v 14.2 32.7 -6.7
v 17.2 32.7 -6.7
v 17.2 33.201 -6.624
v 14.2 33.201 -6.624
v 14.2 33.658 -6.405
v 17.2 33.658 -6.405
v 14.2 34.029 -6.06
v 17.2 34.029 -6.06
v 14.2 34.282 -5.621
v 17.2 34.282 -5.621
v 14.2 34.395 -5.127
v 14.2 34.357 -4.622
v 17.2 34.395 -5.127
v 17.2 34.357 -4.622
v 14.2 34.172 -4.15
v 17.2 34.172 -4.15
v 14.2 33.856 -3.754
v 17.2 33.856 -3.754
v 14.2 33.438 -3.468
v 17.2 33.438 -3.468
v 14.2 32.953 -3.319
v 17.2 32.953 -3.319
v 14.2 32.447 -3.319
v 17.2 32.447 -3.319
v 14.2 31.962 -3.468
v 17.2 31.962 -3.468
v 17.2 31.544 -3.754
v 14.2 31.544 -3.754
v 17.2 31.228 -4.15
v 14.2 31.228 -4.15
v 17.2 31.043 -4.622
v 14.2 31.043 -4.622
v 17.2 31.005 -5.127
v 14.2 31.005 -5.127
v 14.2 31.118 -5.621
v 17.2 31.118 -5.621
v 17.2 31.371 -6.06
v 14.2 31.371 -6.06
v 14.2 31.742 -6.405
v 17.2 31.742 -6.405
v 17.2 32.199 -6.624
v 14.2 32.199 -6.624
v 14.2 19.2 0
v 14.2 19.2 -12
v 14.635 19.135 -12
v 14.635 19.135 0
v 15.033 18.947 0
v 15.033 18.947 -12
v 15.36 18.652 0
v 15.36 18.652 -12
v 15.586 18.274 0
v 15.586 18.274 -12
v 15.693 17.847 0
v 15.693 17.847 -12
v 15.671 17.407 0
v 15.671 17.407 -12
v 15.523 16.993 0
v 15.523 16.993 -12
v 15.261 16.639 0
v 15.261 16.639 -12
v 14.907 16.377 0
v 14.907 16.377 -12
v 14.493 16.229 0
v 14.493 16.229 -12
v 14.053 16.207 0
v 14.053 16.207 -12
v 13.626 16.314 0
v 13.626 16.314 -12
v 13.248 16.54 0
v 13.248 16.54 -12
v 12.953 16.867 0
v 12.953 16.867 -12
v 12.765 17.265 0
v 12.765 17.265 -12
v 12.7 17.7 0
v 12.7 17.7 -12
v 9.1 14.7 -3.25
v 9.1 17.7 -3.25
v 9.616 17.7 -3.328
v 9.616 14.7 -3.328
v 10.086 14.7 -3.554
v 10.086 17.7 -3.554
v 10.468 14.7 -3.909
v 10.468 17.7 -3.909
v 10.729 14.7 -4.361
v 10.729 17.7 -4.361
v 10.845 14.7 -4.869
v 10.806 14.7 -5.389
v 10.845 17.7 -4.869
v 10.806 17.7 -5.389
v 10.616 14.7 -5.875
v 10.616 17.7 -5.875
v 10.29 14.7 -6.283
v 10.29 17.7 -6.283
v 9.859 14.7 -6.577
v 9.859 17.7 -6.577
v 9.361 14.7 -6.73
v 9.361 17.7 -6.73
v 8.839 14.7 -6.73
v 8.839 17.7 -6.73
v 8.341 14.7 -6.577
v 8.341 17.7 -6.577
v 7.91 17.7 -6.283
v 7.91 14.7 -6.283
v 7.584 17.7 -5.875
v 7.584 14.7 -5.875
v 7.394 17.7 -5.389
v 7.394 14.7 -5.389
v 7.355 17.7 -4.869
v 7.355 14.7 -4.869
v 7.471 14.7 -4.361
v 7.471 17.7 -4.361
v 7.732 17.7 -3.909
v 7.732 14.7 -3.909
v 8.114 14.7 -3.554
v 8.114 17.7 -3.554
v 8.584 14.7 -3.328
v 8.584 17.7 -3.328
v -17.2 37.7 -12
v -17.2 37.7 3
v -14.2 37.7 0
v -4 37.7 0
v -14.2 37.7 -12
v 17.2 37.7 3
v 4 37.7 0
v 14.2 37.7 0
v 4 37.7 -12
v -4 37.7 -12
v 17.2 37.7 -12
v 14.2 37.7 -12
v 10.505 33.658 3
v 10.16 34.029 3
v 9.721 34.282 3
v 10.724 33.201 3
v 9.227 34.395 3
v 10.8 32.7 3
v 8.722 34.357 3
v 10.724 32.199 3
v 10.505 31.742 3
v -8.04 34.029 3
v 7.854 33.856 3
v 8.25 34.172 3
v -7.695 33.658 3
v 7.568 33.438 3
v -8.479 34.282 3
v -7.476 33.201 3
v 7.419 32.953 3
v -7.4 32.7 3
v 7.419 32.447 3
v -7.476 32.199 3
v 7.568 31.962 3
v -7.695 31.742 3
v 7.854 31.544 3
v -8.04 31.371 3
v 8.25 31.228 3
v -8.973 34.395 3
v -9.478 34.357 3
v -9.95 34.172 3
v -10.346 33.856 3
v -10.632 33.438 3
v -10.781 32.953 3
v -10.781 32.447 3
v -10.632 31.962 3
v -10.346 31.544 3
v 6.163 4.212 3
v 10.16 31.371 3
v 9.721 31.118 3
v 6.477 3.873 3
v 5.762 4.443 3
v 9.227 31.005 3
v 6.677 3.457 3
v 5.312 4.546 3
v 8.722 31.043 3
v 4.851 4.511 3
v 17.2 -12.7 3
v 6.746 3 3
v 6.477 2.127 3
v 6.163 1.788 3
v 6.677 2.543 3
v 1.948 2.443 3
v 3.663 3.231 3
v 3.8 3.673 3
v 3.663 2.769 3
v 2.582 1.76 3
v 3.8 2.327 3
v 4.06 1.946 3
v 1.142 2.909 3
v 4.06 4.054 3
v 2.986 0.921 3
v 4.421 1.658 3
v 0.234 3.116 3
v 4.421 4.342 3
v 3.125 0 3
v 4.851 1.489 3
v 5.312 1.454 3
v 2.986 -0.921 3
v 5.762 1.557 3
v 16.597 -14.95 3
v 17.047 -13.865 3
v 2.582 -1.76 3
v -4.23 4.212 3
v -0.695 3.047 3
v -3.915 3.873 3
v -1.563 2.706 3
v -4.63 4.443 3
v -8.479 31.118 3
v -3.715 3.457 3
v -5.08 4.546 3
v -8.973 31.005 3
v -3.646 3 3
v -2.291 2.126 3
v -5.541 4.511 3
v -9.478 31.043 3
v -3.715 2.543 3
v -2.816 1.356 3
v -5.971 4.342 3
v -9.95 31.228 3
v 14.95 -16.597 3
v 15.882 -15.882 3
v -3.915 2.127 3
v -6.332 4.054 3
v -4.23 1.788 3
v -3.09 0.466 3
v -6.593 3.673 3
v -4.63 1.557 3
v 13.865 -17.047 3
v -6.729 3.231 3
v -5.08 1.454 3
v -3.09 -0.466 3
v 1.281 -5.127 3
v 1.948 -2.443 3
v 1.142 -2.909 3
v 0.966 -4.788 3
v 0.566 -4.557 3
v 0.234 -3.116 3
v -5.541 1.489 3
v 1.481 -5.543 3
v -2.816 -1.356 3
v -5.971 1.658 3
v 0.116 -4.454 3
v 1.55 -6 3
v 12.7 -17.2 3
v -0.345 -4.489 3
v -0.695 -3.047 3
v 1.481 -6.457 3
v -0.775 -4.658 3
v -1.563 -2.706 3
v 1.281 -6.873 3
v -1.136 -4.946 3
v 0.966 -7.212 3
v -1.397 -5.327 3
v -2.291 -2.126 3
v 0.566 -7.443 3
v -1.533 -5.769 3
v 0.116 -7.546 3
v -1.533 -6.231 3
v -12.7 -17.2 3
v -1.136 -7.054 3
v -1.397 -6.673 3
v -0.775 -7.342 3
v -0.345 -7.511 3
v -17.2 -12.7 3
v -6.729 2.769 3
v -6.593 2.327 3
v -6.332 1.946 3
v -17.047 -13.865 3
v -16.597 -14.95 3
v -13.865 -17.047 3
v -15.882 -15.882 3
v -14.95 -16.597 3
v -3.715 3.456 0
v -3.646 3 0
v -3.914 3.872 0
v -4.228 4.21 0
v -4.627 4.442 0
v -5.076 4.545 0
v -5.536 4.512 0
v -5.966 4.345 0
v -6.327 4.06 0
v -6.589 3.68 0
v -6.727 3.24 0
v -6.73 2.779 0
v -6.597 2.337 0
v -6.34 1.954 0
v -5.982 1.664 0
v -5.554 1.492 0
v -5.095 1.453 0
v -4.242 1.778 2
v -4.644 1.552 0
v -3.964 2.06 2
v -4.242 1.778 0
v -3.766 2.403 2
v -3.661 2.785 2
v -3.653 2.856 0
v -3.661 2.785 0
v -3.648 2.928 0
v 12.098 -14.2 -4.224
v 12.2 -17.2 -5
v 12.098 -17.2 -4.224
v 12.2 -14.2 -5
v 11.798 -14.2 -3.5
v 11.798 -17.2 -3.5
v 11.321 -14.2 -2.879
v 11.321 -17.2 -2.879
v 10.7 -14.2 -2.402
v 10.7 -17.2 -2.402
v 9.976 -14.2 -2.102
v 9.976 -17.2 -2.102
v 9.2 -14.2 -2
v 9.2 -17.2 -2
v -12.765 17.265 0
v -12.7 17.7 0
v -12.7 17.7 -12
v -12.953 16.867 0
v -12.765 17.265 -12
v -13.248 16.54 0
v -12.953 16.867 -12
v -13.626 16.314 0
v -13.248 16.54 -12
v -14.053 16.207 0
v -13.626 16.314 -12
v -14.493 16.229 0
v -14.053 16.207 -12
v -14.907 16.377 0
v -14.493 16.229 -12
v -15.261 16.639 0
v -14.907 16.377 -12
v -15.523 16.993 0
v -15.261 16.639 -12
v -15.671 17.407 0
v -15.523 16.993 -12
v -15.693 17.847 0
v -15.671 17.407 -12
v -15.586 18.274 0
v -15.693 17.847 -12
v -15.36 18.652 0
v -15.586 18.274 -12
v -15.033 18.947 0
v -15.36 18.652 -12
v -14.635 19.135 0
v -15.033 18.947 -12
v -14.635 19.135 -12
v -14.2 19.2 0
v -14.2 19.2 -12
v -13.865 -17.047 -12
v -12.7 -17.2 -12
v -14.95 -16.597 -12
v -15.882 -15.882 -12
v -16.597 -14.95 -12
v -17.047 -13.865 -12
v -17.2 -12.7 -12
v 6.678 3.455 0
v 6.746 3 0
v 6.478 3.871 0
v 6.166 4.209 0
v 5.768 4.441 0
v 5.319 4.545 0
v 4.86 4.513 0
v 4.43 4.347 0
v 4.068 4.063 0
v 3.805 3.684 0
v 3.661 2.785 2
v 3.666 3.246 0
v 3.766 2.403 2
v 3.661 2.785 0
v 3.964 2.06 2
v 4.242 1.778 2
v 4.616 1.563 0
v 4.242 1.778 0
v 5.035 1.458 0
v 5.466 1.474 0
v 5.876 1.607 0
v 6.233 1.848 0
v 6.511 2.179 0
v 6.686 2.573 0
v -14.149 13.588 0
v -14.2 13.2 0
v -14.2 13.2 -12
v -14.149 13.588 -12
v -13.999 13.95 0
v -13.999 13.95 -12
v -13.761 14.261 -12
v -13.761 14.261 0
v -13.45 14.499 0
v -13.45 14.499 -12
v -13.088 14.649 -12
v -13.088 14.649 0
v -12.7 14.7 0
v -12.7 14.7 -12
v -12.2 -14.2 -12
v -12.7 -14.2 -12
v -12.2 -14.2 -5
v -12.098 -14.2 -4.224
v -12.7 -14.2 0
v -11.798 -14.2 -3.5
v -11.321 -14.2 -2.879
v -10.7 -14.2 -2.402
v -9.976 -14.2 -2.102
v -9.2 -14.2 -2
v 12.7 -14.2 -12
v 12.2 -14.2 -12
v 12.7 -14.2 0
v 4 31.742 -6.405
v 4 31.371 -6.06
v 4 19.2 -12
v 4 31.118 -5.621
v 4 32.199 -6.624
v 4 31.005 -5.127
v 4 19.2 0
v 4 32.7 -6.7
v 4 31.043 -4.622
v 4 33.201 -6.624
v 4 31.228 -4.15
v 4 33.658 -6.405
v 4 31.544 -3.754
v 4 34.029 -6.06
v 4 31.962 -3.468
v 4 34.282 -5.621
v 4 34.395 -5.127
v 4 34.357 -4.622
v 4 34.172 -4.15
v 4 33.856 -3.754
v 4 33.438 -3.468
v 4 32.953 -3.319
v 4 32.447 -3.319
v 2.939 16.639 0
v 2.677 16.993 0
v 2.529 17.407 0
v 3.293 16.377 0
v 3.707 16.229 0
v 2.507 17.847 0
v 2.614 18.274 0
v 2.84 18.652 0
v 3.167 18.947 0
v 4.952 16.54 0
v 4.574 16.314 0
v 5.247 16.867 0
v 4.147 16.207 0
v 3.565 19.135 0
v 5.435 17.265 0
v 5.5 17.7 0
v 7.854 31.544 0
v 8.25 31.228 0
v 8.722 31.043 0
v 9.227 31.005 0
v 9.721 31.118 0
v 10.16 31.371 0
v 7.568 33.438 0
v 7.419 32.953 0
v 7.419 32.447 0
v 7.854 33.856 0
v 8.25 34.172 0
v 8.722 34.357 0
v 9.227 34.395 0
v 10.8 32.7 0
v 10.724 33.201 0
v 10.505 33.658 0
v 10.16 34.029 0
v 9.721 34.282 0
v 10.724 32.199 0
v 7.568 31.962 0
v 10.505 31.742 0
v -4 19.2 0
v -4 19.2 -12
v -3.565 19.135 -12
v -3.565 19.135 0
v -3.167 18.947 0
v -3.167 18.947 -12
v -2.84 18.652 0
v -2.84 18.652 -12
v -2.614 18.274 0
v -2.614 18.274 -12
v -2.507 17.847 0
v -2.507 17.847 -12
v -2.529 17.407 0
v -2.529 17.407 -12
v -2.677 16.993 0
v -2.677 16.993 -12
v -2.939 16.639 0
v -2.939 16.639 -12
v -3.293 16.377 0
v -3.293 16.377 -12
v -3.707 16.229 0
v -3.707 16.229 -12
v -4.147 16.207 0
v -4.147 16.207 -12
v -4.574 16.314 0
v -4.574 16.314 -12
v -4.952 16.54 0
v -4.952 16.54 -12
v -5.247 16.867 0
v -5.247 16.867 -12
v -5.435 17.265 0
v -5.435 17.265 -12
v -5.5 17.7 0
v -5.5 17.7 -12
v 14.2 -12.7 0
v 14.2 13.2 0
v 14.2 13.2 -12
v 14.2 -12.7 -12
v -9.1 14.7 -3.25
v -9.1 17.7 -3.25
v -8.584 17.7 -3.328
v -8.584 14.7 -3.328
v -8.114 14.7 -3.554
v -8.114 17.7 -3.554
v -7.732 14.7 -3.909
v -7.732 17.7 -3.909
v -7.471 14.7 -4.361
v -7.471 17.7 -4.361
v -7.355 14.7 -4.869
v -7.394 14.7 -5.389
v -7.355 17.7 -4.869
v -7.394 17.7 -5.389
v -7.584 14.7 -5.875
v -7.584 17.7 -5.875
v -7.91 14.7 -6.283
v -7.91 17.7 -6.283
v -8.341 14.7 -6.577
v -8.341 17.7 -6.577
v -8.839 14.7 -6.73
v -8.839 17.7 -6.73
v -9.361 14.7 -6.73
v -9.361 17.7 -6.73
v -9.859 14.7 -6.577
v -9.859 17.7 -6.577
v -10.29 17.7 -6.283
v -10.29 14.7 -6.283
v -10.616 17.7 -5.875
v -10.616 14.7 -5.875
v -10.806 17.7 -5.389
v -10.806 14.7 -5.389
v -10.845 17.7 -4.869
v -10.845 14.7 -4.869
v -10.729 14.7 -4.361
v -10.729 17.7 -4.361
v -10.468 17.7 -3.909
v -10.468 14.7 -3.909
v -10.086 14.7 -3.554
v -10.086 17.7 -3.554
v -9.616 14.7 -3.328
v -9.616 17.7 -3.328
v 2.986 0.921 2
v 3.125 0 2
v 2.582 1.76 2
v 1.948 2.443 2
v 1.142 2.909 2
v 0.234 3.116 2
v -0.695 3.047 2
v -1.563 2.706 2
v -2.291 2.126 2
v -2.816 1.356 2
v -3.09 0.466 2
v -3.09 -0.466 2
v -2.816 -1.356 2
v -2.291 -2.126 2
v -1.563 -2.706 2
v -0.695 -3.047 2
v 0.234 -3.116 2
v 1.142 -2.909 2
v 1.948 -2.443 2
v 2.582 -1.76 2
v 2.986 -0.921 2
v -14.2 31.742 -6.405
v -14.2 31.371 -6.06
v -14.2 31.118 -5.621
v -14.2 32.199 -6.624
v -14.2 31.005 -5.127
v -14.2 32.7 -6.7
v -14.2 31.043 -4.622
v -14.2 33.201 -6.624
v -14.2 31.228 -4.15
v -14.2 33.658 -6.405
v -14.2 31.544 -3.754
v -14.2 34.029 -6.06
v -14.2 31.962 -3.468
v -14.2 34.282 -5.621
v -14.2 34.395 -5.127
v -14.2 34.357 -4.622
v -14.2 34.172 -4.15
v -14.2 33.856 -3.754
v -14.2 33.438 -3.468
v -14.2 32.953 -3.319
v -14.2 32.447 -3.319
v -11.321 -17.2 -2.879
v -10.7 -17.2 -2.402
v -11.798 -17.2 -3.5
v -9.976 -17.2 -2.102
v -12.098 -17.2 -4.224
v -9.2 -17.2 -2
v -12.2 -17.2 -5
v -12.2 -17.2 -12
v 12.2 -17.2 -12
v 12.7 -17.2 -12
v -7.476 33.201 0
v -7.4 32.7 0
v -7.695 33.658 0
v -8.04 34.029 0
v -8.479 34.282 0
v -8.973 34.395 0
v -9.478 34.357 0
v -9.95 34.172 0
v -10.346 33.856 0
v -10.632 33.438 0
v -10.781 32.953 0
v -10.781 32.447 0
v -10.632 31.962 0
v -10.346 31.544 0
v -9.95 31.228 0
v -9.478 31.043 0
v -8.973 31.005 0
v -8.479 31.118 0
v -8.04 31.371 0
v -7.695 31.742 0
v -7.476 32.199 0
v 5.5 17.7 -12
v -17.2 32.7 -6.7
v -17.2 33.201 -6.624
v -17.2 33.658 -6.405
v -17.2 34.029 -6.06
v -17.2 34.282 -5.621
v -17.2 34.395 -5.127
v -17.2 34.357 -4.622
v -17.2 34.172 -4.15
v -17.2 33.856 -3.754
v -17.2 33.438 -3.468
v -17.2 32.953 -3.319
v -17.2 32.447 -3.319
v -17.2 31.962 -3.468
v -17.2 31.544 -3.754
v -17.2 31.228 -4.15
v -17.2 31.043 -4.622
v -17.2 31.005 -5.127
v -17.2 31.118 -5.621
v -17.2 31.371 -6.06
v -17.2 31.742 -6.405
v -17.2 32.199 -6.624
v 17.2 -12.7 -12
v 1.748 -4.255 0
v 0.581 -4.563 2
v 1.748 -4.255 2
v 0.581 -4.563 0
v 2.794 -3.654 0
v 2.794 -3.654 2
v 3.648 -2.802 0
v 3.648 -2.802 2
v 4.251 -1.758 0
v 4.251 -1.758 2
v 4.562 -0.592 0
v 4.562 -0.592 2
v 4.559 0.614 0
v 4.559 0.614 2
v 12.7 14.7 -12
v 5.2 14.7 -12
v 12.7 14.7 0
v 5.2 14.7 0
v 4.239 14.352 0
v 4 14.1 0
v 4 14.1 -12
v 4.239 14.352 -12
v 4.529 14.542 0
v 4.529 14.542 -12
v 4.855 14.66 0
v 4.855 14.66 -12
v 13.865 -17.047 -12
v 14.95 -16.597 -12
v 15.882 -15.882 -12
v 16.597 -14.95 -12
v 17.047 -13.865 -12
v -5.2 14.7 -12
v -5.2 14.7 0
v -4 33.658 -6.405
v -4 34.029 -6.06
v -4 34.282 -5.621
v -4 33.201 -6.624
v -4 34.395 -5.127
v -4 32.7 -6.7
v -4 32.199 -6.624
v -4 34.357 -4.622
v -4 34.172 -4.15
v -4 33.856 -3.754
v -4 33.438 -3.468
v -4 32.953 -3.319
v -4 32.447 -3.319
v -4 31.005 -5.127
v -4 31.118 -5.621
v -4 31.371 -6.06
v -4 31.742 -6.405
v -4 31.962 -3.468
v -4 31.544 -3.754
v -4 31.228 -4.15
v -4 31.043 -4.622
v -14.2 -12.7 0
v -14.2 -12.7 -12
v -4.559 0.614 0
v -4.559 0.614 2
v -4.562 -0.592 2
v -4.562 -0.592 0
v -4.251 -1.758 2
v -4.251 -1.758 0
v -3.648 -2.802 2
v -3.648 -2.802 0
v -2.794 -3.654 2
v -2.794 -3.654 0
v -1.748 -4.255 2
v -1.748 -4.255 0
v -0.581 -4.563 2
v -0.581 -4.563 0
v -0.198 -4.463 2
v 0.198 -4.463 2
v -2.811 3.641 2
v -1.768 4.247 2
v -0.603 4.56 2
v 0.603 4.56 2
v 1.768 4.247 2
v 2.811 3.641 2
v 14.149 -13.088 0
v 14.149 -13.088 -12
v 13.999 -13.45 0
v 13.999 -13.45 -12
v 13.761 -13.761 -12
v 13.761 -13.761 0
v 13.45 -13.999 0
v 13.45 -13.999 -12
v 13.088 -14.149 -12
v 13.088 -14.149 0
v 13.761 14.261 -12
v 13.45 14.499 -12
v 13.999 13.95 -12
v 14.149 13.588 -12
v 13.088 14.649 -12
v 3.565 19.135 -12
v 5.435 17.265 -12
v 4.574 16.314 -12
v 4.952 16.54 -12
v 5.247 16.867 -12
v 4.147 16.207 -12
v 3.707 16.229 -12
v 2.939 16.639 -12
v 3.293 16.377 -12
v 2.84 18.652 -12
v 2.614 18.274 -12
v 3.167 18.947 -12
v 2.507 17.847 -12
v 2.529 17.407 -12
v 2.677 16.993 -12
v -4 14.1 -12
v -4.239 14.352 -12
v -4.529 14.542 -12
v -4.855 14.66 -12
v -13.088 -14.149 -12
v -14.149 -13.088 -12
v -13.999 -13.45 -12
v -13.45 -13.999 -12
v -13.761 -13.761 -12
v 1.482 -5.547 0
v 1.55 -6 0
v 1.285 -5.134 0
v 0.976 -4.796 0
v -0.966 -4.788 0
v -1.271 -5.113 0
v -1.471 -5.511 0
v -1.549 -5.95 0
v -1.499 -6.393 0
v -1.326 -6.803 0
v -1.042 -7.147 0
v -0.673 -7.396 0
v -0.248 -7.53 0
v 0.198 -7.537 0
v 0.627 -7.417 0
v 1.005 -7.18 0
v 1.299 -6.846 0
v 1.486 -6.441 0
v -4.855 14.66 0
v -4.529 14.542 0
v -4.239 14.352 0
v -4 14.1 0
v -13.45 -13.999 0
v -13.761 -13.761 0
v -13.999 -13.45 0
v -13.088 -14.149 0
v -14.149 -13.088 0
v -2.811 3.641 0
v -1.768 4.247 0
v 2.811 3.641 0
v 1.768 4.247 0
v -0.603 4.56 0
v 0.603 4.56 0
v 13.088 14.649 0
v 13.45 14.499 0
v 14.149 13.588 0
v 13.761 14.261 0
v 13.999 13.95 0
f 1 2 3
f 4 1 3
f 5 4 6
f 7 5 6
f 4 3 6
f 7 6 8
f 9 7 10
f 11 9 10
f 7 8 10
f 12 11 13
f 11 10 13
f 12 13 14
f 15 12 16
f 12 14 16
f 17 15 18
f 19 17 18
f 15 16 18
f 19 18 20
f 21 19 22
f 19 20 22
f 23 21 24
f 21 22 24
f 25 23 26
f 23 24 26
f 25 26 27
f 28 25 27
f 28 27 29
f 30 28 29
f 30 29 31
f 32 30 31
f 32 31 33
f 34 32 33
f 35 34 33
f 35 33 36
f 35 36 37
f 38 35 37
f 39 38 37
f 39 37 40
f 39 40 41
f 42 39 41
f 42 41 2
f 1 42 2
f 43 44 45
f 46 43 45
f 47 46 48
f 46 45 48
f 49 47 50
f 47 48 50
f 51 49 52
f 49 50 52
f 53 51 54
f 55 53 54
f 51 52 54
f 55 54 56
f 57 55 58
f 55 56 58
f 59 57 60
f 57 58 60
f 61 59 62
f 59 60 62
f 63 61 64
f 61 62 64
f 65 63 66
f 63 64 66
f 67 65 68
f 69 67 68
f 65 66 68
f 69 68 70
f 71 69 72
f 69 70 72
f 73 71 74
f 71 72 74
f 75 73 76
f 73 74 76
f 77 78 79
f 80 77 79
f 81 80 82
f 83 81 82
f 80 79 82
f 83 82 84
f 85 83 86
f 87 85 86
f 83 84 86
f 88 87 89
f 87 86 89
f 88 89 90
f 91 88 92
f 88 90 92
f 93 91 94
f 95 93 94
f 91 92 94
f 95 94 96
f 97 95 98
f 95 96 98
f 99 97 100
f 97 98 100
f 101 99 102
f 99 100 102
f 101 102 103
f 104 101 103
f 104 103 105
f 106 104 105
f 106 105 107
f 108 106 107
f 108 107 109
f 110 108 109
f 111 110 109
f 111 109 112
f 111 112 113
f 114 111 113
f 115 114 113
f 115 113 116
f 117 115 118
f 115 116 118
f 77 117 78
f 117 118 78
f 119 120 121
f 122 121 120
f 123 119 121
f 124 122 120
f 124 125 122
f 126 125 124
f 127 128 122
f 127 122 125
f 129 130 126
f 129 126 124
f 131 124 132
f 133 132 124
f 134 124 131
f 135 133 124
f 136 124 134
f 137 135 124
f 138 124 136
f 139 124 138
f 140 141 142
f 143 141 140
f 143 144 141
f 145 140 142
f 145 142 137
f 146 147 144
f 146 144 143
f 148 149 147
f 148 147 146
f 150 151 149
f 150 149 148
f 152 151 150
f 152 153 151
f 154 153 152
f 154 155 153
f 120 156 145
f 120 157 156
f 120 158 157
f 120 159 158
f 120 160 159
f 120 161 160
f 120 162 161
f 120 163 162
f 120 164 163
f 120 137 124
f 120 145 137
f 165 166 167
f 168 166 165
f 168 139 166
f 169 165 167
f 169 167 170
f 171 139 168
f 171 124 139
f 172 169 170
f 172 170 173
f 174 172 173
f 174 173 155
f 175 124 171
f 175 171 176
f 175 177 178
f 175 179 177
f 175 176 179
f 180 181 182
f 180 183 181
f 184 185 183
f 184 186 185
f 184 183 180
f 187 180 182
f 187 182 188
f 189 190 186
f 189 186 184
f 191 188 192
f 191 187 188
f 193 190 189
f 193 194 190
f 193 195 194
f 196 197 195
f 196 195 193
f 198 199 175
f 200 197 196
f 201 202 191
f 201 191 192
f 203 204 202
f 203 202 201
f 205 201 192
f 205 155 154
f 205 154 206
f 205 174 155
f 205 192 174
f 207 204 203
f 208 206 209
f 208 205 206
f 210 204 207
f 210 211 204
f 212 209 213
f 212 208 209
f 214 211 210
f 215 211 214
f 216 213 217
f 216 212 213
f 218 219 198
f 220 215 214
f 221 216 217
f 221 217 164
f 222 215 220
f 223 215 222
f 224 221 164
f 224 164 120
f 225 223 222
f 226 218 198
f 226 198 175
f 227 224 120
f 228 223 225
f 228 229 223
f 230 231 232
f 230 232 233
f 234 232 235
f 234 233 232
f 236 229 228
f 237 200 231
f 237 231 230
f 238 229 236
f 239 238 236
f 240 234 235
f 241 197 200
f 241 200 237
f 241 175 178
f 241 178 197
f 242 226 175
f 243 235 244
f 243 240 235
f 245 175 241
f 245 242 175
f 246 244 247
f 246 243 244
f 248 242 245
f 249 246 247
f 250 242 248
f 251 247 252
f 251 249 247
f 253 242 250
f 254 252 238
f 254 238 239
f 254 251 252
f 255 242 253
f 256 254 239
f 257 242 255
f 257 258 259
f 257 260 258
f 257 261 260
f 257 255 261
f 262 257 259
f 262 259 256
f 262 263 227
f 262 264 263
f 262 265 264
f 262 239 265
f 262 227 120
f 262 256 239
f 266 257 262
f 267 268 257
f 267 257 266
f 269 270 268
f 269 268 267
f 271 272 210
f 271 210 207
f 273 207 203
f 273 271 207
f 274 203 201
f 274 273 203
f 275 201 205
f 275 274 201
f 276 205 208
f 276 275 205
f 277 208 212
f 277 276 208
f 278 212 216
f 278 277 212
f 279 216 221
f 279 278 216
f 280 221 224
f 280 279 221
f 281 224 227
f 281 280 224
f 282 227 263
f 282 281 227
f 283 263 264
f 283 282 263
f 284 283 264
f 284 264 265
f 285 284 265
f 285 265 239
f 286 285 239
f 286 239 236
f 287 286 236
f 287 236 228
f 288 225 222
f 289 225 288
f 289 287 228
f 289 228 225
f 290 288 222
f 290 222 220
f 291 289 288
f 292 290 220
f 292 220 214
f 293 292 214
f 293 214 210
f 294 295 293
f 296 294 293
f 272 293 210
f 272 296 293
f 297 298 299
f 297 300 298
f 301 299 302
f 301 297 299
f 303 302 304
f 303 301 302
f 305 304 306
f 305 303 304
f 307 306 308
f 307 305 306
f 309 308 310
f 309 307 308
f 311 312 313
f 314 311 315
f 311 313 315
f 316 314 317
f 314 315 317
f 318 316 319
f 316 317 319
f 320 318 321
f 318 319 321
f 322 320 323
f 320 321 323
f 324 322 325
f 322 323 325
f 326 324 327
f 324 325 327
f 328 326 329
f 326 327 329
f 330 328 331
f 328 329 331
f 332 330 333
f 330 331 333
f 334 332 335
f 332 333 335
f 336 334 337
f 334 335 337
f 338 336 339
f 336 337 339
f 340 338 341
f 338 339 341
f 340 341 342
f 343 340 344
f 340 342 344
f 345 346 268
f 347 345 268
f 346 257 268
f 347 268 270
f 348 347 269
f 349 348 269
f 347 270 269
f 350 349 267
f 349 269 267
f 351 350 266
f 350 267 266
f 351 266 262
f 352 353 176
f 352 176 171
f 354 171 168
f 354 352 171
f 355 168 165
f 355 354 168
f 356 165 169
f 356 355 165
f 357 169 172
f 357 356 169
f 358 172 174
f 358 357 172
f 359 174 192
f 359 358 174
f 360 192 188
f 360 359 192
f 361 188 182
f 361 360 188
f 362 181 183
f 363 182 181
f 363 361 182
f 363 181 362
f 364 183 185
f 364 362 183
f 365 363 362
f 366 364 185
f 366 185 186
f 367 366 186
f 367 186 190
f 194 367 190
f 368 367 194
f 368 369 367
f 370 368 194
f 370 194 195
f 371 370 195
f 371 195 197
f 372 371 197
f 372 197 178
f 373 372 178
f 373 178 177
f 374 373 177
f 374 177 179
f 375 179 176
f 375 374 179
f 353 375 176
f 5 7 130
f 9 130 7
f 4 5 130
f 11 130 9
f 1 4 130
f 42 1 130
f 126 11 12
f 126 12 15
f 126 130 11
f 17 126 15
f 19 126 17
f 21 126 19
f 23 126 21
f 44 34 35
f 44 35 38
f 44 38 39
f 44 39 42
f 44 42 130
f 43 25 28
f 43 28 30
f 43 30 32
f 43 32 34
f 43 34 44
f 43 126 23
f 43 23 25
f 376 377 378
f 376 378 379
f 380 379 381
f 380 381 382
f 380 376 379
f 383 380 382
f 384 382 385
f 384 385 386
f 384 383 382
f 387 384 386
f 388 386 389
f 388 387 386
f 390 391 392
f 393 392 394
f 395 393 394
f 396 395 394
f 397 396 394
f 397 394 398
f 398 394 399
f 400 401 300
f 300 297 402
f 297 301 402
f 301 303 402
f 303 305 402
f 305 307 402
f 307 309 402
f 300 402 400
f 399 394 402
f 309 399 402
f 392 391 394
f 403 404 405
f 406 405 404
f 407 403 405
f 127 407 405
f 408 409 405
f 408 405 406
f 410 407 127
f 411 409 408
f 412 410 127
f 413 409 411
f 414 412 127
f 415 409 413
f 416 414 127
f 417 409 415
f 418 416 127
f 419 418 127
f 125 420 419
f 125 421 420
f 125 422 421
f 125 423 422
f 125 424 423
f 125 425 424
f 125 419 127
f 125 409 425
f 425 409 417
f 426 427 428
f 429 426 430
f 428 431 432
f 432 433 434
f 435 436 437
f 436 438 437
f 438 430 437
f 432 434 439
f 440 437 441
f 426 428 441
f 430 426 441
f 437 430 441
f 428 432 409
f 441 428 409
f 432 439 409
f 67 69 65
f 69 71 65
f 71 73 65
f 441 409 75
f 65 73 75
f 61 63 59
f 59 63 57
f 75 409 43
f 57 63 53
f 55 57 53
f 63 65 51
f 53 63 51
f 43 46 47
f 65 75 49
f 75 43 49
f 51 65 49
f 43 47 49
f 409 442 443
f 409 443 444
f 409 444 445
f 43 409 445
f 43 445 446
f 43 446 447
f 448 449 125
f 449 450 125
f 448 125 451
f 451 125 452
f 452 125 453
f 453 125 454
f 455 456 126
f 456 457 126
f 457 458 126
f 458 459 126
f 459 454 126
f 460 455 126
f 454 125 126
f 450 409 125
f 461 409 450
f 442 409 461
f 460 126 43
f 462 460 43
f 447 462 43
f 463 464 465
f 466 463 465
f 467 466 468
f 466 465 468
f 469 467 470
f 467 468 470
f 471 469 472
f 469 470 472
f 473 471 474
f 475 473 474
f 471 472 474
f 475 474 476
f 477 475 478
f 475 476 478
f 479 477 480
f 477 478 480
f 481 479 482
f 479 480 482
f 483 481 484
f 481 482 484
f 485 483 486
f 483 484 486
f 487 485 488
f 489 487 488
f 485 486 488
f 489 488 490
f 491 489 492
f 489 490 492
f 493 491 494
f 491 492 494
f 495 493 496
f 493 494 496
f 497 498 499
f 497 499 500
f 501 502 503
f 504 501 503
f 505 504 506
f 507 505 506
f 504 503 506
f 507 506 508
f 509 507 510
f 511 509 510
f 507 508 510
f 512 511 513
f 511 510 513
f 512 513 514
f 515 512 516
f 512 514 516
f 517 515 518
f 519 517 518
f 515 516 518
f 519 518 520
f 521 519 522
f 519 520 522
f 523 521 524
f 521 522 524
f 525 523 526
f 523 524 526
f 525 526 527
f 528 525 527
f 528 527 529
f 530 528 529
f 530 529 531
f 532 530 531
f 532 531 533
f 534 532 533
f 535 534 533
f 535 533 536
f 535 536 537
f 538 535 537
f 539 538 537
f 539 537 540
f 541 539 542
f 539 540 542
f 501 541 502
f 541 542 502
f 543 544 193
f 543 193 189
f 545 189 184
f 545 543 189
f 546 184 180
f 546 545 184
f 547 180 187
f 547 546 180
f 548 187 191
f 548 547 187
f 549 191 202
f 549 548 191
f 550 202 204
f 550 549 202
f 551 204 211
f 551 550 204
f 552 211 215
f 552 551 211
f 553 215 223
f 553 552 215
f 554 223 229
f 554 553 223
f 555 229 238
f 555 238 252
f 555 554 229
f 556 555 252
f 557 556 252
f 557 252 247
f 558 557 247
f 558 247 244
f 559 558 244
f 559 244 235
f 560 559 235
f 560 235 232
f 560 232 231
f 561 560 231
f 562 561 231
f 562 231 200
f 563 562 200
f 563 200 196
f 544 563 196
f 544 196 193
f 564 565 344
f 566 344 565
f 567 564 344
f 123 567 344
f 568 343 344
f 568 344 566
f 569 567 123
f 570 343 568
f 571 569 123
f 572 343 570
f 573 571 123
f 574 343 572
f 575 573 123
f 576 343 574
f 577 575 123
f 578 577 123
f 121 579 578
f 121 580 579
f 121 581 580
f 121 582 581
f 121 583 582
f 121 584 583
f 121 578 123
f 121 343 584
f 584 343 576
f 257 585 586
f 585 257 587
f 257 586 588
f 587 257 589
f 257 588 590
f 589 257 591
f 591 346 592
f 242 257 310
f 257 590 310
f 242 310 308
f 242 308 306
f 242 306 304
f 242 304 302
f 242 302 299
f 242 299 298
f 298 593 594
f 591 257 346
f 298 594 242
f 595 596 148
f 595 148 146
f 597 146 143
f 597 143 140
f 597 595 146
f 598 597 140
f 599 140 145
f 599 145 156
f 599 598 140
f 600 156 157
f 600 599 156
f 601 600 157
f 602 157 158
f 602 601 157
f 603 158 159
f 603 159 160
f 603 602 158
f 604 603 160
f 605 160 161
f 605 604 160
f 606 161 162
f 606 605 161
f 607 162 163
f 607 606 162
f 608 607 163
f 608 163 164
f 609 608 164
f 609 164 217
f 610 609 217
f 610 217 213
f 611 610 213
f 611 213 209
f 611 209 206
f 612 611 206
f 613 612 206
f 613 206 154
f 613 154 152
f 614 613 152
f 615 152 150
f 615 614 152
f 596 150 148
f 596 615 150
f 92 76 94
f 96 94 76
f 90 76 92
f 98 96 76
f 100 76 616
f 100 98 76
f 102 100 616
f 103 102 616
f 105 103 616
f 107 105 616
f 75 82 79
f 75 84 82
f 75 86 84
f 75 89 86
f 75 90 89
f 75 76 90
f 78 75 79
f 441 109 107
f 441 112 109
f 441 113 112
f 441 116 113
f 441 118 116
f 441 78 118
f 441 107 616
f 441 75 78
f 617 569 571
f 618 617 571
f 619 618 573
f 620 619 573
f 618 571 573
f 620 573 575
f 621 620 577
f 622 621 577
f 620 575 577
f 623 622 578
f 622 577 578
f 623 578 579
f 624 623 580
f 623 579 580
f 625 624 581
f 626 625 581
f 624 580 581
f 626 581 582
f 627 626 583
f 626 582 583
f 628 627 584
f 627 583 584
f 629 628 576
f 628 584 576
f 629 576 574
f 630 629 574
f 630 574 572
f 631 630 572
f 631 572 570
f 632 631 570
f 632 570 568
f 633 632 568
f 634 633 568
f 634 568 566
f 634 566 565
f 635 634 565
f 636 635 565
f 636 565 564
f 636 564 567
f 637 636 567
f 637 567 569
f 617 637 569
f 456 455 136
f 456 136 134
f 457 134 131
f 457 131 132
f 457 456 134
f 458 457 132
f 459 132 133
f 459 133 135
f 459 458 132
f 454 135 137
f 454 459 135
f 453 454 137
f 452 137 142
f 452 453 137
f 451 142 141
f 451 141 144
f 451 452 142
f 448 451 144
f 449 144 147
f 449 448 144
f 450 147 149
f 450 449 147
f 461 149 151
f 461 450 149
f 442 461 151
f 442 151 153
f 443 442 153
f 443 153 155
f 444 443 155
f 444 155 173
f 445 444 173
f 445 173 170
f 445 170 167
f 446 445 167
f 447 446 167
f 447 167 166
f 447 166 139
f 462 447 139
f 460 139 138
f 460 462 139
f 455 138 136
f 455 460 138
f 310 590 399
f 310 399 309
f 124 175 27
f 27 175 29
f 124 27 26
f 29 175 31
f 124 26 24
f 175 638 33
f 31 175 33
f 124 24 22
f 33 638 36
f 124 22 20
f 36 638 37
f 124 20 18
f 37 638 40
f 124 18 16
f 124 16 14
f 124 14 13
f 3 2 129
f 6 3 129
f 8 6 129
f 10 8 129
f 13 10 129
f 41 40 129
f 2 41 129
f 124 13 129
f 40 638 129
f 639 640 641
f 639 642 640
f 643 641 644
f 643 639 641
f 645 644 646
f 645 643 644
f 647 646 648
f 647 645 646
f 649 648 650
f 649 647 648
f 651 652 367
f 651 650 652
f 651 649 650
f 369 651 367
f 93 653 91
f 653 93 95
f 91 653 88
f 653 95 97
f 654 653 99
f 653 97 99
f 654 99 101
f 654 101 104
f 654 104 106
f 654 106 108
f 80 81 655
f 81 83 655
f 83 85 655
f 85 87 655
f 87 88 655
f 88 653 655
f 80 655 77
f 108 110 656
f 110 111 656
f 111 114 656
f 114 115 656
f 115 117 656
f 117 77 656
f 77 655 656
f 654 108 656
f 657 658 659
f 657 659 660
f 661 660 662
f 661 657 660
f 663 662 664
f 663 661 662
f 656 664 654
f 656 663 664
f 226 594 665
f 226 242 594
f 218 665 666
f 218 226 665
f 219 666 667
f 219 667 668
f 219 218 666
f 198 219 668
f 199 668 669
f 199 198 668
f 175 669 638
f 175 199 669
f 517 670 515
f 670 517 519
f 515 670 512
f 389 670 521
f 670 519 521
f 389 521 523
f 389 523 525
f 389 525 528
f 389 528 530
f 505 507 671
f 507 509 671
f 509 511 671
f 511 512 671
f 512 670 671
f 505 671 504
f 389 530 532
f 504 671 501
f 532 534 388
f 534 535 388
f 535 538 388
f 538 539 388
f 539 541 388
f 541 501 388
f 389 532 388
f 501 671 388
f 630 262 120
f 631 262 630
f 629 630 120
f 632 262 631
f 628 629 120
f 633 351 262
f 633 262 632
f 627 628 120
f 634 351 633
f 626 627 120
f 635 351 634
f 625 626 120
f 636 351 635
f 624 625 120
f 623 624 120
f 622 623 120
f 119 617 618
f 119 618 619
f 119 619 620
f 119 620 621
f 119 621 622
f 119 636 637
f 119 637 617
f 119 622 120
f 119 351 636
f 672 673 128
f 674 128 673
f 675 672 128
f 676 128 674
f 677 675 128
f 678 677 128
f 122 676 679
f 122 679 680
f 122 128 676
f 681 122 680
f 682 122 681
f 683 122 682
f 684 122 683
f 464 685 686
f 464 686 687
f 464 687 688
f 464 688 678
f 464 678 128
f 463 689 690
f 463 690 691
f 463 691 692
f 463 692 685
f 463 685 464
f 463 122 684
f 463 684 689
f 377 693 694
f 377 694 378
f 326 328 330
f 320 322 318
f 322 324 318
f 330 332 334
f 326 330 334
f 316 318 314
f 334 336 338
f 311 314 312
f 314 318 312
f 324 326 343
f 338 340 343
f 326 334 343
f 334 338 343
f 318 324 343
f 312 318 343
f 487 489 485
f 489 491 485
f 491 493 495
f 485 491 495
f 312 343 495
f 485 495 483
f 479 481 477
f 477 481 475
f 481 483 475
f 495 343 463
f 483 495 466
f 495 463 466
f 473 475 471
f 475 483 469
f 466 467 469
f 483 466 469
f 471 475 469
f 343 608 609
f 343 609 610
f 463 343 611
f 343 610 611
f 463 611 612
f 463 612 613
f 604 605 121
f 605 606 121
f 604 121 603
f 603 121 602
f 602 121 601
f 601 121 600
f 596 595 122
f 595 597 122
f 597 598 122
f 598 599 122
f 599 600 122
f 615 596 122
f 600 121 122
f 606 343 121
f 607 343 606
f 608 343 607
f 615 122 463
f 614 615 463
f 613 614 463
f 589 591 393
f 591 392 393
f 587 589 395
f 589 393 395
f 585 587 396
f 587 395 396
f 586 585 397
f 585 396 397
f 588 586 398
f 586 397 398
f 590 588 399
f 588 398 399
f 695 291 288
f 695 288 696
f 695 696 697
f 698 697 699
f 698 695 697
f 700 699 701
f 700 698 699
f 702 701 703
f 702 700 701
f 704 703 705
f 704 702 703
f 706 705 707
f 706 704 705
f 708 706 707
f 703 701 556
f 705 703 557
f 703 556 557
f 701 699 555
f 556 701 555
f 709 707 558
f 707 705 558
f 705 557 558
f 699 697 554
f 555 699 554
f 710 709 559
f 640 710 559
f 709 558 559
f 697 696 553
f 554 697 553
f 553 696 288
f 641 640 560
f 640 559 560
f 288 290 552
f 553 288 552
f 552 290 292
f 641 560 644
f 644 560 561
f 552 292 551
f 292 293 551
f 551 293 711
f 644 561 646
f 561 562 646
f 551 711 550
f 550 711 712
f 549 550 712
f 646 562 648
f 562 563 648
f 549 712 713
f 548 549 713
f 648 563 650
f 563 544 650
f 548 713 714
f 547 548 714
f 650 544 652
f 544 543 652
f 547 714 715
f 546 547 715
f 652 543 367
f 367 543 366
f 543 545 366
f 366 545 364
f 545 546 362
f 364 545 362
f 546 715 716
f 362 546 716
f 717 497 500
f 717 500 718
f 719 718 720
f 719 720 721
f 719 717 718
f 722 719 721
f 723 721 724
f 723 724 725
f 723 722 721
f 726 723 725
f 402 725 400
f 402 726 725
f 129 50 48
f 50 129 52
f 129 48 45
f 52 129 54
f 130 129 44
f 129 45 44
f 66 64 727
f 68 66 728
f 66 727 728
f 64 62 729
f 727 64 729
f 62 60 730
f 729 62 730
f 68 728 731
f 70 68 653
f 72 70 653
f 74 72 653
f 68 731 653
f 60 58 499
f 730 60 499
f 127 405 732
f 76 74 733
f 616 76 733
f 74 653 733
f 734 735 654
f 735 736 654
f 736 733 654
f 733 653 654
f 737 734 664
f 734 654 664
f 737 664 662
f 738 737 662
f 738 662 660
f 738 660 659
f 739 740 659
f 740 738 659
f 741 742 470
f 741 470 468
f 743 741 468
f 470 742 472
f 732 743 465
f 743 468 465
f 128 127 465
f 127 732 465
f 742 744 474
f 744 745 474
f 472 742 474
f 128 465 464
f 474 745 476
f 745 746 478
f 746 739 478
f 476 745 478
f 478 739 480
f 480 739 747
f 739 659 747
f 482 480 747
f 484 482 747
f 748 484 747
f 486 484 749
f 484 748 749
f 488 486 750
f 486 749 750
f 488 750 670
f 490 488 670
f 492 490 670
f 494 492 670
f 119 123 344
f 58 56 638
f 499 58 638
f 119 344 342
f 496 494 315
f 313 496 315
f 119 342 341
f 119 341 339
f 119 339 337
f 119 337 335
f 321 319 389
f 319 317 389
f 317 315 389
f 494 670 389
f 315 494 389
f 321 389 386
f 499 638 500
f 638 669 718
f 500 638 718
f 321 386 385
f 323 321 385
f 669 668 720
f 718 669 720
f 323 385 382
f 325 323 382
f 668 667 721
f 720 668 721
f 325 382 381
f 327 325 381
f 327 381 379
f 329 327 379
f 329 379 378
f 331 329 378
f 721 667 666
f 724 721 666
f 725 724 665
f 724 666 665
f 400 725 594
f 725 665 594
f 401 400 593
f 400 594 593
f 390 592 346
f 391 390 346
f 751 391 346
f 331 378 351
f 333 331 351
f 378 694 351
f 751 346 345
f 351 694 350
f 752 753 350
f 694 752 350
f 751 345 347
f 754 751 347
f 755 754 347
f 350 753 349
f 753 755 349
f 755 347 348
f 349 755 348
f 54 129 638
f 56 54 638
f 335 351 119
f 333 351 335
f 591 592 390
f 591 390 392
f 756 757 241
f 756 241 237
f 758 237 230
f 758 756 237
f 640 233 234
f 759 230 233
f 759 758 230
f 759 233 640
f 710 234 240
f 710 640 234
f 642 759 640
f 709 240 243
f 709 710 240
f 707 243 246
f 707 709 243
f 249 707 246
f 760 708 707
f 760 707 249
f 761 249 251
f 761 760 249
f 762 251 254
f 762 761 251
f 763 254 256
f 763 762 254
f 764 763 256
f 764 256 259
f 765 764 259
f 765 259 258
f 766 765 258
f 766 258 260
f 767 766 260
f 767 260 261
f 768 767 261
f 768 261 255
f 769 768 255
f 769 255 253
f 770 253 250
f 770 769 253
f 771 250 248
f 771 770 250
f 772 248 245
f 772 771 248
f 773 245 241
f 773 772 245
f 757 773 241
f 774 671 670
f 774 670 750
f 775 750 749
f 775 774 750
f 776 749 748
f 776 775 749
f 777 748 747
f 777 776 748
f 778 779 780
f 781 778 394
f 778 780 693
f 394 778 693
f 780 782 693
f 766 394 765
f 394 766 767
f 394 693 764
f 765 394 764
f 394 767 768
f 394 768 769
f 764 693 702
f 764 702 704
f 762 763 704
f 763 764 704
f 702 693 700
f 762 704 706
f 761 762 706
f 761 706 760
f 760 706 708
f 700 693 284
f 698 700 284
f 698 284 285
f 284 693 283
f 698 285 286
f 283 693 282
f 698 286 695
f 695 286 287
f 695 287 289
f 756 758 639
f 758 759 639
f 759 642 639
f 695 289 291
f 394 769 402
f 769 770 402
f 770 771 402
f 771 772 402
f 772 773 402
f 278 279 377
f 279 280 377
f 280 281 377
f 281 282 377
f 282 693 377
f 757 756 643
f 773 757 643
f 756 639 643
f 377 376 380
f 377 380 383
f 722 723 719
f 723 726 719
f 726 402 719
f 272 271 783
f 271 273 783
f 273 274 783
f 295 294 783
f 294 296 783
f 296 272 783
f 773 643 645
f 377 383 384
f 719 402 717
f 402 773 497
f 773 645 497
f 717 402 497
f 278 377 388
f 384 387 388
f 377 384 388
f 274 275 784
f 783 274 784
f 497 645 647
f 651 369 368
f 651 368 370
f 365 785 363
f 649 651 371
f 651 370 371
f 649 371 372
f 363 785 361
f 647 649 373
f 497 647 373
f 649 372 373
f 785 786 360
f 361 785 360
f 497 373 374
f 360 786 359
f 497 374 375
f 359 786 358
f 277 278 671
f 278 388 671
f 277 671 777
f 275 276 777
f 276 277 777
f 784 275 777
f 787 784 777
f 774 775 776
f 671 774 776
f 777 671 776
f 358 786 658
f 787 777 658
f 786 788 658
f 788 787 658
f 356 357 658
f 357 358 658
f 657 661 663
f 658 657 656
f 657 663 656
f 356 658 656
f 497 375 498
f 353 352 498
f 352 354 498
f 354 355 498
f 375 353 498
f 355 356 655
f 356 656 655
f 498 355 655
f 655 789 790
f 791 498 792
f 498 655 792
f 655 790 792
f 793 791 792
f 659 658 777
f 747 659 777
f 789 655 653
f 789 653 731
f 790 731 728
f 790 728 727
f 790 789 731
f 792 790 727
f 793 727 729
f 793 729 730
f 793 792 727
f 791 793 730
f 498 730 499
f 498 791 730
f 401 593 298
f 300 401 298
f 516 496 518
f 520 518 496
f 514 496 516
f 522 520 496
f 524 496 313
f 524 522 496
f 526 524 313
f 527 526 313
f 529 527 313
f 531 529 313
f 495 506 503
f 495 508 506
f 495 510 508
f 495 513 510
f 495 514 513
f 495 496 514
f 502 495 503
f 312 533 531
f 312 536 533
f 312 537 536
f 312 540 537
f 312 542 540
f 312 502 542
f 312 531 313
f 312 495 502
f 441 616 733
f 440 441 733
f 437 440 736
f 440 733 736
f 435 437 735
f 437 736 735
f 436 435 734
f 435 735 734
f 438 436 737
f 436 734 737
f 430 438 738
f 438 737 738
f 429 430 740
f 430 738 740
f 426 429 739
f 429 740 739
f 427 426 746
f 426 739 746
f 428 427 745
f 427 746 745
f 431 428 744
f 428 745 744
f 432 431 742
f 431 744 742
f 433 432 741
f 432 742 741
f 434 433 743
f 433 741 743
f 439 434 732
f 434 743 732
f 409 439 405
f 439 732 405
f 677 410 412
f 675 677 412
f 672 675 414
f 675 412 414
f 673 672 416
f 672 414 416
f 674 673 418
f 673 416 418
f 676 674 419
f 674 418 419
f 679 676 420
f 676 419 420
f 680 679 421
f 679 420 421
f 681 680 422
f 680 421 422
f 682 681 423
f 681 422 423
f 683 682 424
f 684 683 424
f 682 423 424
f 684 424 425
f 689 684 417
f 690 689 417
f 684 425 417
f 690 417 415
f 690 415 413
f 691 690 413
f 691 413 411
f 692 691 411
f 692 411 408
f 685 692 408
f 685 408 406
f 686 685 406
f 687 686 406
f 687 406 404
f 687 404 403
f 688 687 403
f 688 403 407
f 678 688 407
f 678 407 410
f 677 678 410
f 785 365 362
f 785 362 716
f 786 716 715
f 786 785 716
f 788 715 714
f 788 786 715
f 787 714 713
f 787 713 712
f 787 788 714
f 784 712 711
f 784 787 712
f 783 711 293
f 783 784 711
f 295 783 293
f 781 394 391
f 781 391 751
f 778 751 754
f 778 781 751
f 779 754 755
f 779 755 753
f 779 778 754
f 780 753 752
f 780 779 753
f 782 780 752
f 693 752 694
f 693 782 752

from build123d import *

# Parameters (mm, degrees)
MAIN_POCKETS_DEPTH   = 12
SKETCH2_W            = 34.4
SKETCH2_H            = 54.9
SKETCH2_R            = 1.55
SKETCH2_R_2          = 1.7
SKETCH2_R_3          = 3.125
MOUNTING_HOLES_DEPTH = 3
SKETCH3_R            = 4.6
CUT_EXTRUDE1_DEPTH   = 2
SKETCH4_R            = 1.5
CUT_EXTRUDE2_DEPTH   = 12
SKETCH5_R            = 1.75
CUT_EXTRUDE4_DEPTH   = 3
SKETCH6_W            = 24.4
SKETCH6_H            = 10
CUT_EXTRUDE6_DEPTH   = 3
SKETCH8_R            = 1.7
CUT_EXTRUDE7_DEPTH   = 53.427569083
FILLET1_R            = 1.5
FILLET2_R            = 4.5
FILLET3_R            = 3


with BuildPart() as part:
    # Sketch1 → Main Pockets (new body)
    with BuildSketch(Plane.XY):
        Polygon((17.2, 1.276454737), (17.2, 37.7), (14.2, 37.7), (14.2, 17.7), (4, 17.7), (4, 37.7), (-4, 37.7), (-4, 17.7), (-14.2, 17.7), (-14.2, 37.7), (-17.2, 37.7), (-17.2, 1.276454737), (-17.2, -17.2), (17.2, -17.2), align=None)
        Polygon((-14.2, -14.2), (14.2, -14.2), (14.2, 0), (14.2, 14.7), (4, 14.7), (4, 14.1), (-4, 14.1), (-4, 14.7), (-14.2, 14.7), (-14.2, 0), align=None, mode=Mode.SUBTRACT)
    extrude(amount=-MAIN_POCKETS_DEPTH)

    # Sketch2 → Mounting Holes (add)
    with BuildSketch(Plane.XY):
        with Locations((0, 10.25)):
            Rectangle(SKETCH2_W, SKETCH2_H)
        with Locations((0, -6)):
            Circle(SKETCH2_R, mode=Mode.SUBTRACT)
        with Locations((-5.196152423, 3)):
            Circle(SKETCH2_R, mode=Mode.SUBTRACT)
        with Locations((5.196152423, 3)):
            Circle(SKETCH2_R, mode=Mode.SUBTRACT)
        with Locations((-9.1, 32.7)):
            Circle(SKETCH2_R_2, mode=Mode.SUBTRACT)
        with Locations((9.1, 32.7)):
            Circle(SKETCH2_R_2, mode=Mode.SUBTRACT)
        Circle(SKETCH2_R_3, mode=Mode.SUBTRACT)
    extrude(amount=MOUNTING_HOLES_DEPTH)

    # Sketch3 → Cut-Extrude1 (cut)
    with BuildSketch(Plane.XY):
        Circle(SKETCH3_R)
    extrude(amount=CUT_EXTRUDE1_DEPTH, mode=Mode.SUBTRACT)

    # Sketch4 → Cut-Extrude2 (cut)
    with BuildSketch(Plane(origin=(0, 0, -12), x_dir=(-1, 0, 0), z_dir=(0, 0, -1))):
        with Locations((-14.2, 17.7)):
            Circle(SKETCH4_R)
        with Locations((-4, 17.7)):
            Circle(SKETCH4_R)
        with Locations((4, 17.7)):
            Circle(SKETCH4_R)
        with Locations((14.2, 17.7)):
            Circle(SKETCH4_R)
    extrude(amount=-CUT_EXTRUDE2_DEPTH, mode=Mode.SUBTRACT)

    # Sketch5 → Cut-Extrude4 (cut)
    with BuildSketch(Plane(origin=(0, 17.7, 0), x_dir=(1, 0, 0), z_dir=(0, 1, 0))):
        with Locations(Location((-9.1, 5, 0), (0, 0, 270))):
            Circle(SKETCH5_R)
        with Locations(Location((9.1, 5, 0), (0, 0, 270))):
            Circle(SKETCH5_R)
    extrude(amount=-CUT_EXTRUDE4_DEPTH, mode=Mode.SUBTRACT)

    # Sketch6 → Cut-Extrude6 (cut)
    with BuildSketch(Plane.XZ.offset(17.2)):
        with Locations((0, -7)):
            Rectangle(SKETCH6_W, SKETCH6_H)
    extrude(amount=-CUT_EXTRUDE6_DEPTH, mode=Mode.SUBTRACT)

    # Sketch8 → Cut-Extrude7 (cut, through all)
    with BuildSketch(Plane(origin=(17.2, 0, 0), x_dir=(0, 0, -1), z_dir=(1, 0, 0))):
        with Locations((5, 32.7)):
            Circle(SKETCH8_R)
    extrude(amount=-CUT_EXTRUDE7_DEPTH, mode=Mode.SUBTRACT)

    # Fillet1
    # the kernel refuses this fillet: 1.5 mm, written as the material it adds along each edge
    with BuildSketch(Plane(origin=(-4, 14.7, 3), x_dir=(0, -1, 0), z_dir=(0, 0, -1))) as fillet1_piece_1:
        with BuildLine():
            CenterArc((1.5, 1.2), FILLET1_R, 180, 53.130102354)
            Line((0, 1.2), (0, 0))
            Line((0, 0), (0.6, 0))
        make_face()
    extrude(amount=15)
    with BuildSketch(Plane(origin=(4, 14.7, 3), x_dir=(1, 0, 0), z_dir=(0, 0, -1))) as fillet1_piece_2:
        with BuildLine():
            CenterArc((1.2, 1.5), FILLET1_R, 216.869897646, 53.130102354)
            Line((0, 0.6), (0, 0))
            Line((0, 0), (1.2, 0))
        make_face()
    extrude(amount=15)
    with BuildSketch(Plane(origin=(-14.2, -14.2, 0), x_dir=(1, 0, 0), z_dir=(0, 0, -1))) as fillet1_piece_3:
        with BuildLine():
            CenterArc((FILLET1_R, -FILLET1_R), FILLET1_R, 90, 90)
            Line((0, -FILLET1_R), (0, 0))
            Line((0, 0), (FILLET1_R, 0))
        make_face()
    extrude(amount=12)
    with BuildSketch(Plane(origin=(-14.2, 14.7, 0), x_dir=(1, 0, 0), z_dir=(0, 0, -1)), Plane(origin=(14.2, 14.7, 0), x_dir=(0, -1, 0), z_dir=(0, 0, -1)), Plane(origin=(14.2, -14.2, 0), x_dir=(-1, 0, 0), z_dir=(0, 0, -1))) as fillet1_piece_4:
        with BuildLine():
            CenterArc((FILLET1_R, FILLET1_R), FILLET1_R, 180, 90)
            Line((0, FILLET1_R), (0, 0))
            Line((0, 0), (FILLET1_R, 0))
        make_face()
    extrude(amount=12)

    # Fillet2
    fillet2_edges = [part.edges().sort_by_distance(p)[0] for p in [
        (17.2, -17.2, -4.5),
        (-17.2, -17.2, -4.5),
    ]]
    fillet(fillet2_edges, radius=FILLET2_R)

    # Fillet3
    fillet3_edges = [part.edges().sort_by_distance(p)[0] for p in [
        (-12.2, -15.7, -2),
        (12.2, -15.7, -2),
    ]]
    fillet(fillet3_edges, radius=FILLET3_R)


solid = part.part
